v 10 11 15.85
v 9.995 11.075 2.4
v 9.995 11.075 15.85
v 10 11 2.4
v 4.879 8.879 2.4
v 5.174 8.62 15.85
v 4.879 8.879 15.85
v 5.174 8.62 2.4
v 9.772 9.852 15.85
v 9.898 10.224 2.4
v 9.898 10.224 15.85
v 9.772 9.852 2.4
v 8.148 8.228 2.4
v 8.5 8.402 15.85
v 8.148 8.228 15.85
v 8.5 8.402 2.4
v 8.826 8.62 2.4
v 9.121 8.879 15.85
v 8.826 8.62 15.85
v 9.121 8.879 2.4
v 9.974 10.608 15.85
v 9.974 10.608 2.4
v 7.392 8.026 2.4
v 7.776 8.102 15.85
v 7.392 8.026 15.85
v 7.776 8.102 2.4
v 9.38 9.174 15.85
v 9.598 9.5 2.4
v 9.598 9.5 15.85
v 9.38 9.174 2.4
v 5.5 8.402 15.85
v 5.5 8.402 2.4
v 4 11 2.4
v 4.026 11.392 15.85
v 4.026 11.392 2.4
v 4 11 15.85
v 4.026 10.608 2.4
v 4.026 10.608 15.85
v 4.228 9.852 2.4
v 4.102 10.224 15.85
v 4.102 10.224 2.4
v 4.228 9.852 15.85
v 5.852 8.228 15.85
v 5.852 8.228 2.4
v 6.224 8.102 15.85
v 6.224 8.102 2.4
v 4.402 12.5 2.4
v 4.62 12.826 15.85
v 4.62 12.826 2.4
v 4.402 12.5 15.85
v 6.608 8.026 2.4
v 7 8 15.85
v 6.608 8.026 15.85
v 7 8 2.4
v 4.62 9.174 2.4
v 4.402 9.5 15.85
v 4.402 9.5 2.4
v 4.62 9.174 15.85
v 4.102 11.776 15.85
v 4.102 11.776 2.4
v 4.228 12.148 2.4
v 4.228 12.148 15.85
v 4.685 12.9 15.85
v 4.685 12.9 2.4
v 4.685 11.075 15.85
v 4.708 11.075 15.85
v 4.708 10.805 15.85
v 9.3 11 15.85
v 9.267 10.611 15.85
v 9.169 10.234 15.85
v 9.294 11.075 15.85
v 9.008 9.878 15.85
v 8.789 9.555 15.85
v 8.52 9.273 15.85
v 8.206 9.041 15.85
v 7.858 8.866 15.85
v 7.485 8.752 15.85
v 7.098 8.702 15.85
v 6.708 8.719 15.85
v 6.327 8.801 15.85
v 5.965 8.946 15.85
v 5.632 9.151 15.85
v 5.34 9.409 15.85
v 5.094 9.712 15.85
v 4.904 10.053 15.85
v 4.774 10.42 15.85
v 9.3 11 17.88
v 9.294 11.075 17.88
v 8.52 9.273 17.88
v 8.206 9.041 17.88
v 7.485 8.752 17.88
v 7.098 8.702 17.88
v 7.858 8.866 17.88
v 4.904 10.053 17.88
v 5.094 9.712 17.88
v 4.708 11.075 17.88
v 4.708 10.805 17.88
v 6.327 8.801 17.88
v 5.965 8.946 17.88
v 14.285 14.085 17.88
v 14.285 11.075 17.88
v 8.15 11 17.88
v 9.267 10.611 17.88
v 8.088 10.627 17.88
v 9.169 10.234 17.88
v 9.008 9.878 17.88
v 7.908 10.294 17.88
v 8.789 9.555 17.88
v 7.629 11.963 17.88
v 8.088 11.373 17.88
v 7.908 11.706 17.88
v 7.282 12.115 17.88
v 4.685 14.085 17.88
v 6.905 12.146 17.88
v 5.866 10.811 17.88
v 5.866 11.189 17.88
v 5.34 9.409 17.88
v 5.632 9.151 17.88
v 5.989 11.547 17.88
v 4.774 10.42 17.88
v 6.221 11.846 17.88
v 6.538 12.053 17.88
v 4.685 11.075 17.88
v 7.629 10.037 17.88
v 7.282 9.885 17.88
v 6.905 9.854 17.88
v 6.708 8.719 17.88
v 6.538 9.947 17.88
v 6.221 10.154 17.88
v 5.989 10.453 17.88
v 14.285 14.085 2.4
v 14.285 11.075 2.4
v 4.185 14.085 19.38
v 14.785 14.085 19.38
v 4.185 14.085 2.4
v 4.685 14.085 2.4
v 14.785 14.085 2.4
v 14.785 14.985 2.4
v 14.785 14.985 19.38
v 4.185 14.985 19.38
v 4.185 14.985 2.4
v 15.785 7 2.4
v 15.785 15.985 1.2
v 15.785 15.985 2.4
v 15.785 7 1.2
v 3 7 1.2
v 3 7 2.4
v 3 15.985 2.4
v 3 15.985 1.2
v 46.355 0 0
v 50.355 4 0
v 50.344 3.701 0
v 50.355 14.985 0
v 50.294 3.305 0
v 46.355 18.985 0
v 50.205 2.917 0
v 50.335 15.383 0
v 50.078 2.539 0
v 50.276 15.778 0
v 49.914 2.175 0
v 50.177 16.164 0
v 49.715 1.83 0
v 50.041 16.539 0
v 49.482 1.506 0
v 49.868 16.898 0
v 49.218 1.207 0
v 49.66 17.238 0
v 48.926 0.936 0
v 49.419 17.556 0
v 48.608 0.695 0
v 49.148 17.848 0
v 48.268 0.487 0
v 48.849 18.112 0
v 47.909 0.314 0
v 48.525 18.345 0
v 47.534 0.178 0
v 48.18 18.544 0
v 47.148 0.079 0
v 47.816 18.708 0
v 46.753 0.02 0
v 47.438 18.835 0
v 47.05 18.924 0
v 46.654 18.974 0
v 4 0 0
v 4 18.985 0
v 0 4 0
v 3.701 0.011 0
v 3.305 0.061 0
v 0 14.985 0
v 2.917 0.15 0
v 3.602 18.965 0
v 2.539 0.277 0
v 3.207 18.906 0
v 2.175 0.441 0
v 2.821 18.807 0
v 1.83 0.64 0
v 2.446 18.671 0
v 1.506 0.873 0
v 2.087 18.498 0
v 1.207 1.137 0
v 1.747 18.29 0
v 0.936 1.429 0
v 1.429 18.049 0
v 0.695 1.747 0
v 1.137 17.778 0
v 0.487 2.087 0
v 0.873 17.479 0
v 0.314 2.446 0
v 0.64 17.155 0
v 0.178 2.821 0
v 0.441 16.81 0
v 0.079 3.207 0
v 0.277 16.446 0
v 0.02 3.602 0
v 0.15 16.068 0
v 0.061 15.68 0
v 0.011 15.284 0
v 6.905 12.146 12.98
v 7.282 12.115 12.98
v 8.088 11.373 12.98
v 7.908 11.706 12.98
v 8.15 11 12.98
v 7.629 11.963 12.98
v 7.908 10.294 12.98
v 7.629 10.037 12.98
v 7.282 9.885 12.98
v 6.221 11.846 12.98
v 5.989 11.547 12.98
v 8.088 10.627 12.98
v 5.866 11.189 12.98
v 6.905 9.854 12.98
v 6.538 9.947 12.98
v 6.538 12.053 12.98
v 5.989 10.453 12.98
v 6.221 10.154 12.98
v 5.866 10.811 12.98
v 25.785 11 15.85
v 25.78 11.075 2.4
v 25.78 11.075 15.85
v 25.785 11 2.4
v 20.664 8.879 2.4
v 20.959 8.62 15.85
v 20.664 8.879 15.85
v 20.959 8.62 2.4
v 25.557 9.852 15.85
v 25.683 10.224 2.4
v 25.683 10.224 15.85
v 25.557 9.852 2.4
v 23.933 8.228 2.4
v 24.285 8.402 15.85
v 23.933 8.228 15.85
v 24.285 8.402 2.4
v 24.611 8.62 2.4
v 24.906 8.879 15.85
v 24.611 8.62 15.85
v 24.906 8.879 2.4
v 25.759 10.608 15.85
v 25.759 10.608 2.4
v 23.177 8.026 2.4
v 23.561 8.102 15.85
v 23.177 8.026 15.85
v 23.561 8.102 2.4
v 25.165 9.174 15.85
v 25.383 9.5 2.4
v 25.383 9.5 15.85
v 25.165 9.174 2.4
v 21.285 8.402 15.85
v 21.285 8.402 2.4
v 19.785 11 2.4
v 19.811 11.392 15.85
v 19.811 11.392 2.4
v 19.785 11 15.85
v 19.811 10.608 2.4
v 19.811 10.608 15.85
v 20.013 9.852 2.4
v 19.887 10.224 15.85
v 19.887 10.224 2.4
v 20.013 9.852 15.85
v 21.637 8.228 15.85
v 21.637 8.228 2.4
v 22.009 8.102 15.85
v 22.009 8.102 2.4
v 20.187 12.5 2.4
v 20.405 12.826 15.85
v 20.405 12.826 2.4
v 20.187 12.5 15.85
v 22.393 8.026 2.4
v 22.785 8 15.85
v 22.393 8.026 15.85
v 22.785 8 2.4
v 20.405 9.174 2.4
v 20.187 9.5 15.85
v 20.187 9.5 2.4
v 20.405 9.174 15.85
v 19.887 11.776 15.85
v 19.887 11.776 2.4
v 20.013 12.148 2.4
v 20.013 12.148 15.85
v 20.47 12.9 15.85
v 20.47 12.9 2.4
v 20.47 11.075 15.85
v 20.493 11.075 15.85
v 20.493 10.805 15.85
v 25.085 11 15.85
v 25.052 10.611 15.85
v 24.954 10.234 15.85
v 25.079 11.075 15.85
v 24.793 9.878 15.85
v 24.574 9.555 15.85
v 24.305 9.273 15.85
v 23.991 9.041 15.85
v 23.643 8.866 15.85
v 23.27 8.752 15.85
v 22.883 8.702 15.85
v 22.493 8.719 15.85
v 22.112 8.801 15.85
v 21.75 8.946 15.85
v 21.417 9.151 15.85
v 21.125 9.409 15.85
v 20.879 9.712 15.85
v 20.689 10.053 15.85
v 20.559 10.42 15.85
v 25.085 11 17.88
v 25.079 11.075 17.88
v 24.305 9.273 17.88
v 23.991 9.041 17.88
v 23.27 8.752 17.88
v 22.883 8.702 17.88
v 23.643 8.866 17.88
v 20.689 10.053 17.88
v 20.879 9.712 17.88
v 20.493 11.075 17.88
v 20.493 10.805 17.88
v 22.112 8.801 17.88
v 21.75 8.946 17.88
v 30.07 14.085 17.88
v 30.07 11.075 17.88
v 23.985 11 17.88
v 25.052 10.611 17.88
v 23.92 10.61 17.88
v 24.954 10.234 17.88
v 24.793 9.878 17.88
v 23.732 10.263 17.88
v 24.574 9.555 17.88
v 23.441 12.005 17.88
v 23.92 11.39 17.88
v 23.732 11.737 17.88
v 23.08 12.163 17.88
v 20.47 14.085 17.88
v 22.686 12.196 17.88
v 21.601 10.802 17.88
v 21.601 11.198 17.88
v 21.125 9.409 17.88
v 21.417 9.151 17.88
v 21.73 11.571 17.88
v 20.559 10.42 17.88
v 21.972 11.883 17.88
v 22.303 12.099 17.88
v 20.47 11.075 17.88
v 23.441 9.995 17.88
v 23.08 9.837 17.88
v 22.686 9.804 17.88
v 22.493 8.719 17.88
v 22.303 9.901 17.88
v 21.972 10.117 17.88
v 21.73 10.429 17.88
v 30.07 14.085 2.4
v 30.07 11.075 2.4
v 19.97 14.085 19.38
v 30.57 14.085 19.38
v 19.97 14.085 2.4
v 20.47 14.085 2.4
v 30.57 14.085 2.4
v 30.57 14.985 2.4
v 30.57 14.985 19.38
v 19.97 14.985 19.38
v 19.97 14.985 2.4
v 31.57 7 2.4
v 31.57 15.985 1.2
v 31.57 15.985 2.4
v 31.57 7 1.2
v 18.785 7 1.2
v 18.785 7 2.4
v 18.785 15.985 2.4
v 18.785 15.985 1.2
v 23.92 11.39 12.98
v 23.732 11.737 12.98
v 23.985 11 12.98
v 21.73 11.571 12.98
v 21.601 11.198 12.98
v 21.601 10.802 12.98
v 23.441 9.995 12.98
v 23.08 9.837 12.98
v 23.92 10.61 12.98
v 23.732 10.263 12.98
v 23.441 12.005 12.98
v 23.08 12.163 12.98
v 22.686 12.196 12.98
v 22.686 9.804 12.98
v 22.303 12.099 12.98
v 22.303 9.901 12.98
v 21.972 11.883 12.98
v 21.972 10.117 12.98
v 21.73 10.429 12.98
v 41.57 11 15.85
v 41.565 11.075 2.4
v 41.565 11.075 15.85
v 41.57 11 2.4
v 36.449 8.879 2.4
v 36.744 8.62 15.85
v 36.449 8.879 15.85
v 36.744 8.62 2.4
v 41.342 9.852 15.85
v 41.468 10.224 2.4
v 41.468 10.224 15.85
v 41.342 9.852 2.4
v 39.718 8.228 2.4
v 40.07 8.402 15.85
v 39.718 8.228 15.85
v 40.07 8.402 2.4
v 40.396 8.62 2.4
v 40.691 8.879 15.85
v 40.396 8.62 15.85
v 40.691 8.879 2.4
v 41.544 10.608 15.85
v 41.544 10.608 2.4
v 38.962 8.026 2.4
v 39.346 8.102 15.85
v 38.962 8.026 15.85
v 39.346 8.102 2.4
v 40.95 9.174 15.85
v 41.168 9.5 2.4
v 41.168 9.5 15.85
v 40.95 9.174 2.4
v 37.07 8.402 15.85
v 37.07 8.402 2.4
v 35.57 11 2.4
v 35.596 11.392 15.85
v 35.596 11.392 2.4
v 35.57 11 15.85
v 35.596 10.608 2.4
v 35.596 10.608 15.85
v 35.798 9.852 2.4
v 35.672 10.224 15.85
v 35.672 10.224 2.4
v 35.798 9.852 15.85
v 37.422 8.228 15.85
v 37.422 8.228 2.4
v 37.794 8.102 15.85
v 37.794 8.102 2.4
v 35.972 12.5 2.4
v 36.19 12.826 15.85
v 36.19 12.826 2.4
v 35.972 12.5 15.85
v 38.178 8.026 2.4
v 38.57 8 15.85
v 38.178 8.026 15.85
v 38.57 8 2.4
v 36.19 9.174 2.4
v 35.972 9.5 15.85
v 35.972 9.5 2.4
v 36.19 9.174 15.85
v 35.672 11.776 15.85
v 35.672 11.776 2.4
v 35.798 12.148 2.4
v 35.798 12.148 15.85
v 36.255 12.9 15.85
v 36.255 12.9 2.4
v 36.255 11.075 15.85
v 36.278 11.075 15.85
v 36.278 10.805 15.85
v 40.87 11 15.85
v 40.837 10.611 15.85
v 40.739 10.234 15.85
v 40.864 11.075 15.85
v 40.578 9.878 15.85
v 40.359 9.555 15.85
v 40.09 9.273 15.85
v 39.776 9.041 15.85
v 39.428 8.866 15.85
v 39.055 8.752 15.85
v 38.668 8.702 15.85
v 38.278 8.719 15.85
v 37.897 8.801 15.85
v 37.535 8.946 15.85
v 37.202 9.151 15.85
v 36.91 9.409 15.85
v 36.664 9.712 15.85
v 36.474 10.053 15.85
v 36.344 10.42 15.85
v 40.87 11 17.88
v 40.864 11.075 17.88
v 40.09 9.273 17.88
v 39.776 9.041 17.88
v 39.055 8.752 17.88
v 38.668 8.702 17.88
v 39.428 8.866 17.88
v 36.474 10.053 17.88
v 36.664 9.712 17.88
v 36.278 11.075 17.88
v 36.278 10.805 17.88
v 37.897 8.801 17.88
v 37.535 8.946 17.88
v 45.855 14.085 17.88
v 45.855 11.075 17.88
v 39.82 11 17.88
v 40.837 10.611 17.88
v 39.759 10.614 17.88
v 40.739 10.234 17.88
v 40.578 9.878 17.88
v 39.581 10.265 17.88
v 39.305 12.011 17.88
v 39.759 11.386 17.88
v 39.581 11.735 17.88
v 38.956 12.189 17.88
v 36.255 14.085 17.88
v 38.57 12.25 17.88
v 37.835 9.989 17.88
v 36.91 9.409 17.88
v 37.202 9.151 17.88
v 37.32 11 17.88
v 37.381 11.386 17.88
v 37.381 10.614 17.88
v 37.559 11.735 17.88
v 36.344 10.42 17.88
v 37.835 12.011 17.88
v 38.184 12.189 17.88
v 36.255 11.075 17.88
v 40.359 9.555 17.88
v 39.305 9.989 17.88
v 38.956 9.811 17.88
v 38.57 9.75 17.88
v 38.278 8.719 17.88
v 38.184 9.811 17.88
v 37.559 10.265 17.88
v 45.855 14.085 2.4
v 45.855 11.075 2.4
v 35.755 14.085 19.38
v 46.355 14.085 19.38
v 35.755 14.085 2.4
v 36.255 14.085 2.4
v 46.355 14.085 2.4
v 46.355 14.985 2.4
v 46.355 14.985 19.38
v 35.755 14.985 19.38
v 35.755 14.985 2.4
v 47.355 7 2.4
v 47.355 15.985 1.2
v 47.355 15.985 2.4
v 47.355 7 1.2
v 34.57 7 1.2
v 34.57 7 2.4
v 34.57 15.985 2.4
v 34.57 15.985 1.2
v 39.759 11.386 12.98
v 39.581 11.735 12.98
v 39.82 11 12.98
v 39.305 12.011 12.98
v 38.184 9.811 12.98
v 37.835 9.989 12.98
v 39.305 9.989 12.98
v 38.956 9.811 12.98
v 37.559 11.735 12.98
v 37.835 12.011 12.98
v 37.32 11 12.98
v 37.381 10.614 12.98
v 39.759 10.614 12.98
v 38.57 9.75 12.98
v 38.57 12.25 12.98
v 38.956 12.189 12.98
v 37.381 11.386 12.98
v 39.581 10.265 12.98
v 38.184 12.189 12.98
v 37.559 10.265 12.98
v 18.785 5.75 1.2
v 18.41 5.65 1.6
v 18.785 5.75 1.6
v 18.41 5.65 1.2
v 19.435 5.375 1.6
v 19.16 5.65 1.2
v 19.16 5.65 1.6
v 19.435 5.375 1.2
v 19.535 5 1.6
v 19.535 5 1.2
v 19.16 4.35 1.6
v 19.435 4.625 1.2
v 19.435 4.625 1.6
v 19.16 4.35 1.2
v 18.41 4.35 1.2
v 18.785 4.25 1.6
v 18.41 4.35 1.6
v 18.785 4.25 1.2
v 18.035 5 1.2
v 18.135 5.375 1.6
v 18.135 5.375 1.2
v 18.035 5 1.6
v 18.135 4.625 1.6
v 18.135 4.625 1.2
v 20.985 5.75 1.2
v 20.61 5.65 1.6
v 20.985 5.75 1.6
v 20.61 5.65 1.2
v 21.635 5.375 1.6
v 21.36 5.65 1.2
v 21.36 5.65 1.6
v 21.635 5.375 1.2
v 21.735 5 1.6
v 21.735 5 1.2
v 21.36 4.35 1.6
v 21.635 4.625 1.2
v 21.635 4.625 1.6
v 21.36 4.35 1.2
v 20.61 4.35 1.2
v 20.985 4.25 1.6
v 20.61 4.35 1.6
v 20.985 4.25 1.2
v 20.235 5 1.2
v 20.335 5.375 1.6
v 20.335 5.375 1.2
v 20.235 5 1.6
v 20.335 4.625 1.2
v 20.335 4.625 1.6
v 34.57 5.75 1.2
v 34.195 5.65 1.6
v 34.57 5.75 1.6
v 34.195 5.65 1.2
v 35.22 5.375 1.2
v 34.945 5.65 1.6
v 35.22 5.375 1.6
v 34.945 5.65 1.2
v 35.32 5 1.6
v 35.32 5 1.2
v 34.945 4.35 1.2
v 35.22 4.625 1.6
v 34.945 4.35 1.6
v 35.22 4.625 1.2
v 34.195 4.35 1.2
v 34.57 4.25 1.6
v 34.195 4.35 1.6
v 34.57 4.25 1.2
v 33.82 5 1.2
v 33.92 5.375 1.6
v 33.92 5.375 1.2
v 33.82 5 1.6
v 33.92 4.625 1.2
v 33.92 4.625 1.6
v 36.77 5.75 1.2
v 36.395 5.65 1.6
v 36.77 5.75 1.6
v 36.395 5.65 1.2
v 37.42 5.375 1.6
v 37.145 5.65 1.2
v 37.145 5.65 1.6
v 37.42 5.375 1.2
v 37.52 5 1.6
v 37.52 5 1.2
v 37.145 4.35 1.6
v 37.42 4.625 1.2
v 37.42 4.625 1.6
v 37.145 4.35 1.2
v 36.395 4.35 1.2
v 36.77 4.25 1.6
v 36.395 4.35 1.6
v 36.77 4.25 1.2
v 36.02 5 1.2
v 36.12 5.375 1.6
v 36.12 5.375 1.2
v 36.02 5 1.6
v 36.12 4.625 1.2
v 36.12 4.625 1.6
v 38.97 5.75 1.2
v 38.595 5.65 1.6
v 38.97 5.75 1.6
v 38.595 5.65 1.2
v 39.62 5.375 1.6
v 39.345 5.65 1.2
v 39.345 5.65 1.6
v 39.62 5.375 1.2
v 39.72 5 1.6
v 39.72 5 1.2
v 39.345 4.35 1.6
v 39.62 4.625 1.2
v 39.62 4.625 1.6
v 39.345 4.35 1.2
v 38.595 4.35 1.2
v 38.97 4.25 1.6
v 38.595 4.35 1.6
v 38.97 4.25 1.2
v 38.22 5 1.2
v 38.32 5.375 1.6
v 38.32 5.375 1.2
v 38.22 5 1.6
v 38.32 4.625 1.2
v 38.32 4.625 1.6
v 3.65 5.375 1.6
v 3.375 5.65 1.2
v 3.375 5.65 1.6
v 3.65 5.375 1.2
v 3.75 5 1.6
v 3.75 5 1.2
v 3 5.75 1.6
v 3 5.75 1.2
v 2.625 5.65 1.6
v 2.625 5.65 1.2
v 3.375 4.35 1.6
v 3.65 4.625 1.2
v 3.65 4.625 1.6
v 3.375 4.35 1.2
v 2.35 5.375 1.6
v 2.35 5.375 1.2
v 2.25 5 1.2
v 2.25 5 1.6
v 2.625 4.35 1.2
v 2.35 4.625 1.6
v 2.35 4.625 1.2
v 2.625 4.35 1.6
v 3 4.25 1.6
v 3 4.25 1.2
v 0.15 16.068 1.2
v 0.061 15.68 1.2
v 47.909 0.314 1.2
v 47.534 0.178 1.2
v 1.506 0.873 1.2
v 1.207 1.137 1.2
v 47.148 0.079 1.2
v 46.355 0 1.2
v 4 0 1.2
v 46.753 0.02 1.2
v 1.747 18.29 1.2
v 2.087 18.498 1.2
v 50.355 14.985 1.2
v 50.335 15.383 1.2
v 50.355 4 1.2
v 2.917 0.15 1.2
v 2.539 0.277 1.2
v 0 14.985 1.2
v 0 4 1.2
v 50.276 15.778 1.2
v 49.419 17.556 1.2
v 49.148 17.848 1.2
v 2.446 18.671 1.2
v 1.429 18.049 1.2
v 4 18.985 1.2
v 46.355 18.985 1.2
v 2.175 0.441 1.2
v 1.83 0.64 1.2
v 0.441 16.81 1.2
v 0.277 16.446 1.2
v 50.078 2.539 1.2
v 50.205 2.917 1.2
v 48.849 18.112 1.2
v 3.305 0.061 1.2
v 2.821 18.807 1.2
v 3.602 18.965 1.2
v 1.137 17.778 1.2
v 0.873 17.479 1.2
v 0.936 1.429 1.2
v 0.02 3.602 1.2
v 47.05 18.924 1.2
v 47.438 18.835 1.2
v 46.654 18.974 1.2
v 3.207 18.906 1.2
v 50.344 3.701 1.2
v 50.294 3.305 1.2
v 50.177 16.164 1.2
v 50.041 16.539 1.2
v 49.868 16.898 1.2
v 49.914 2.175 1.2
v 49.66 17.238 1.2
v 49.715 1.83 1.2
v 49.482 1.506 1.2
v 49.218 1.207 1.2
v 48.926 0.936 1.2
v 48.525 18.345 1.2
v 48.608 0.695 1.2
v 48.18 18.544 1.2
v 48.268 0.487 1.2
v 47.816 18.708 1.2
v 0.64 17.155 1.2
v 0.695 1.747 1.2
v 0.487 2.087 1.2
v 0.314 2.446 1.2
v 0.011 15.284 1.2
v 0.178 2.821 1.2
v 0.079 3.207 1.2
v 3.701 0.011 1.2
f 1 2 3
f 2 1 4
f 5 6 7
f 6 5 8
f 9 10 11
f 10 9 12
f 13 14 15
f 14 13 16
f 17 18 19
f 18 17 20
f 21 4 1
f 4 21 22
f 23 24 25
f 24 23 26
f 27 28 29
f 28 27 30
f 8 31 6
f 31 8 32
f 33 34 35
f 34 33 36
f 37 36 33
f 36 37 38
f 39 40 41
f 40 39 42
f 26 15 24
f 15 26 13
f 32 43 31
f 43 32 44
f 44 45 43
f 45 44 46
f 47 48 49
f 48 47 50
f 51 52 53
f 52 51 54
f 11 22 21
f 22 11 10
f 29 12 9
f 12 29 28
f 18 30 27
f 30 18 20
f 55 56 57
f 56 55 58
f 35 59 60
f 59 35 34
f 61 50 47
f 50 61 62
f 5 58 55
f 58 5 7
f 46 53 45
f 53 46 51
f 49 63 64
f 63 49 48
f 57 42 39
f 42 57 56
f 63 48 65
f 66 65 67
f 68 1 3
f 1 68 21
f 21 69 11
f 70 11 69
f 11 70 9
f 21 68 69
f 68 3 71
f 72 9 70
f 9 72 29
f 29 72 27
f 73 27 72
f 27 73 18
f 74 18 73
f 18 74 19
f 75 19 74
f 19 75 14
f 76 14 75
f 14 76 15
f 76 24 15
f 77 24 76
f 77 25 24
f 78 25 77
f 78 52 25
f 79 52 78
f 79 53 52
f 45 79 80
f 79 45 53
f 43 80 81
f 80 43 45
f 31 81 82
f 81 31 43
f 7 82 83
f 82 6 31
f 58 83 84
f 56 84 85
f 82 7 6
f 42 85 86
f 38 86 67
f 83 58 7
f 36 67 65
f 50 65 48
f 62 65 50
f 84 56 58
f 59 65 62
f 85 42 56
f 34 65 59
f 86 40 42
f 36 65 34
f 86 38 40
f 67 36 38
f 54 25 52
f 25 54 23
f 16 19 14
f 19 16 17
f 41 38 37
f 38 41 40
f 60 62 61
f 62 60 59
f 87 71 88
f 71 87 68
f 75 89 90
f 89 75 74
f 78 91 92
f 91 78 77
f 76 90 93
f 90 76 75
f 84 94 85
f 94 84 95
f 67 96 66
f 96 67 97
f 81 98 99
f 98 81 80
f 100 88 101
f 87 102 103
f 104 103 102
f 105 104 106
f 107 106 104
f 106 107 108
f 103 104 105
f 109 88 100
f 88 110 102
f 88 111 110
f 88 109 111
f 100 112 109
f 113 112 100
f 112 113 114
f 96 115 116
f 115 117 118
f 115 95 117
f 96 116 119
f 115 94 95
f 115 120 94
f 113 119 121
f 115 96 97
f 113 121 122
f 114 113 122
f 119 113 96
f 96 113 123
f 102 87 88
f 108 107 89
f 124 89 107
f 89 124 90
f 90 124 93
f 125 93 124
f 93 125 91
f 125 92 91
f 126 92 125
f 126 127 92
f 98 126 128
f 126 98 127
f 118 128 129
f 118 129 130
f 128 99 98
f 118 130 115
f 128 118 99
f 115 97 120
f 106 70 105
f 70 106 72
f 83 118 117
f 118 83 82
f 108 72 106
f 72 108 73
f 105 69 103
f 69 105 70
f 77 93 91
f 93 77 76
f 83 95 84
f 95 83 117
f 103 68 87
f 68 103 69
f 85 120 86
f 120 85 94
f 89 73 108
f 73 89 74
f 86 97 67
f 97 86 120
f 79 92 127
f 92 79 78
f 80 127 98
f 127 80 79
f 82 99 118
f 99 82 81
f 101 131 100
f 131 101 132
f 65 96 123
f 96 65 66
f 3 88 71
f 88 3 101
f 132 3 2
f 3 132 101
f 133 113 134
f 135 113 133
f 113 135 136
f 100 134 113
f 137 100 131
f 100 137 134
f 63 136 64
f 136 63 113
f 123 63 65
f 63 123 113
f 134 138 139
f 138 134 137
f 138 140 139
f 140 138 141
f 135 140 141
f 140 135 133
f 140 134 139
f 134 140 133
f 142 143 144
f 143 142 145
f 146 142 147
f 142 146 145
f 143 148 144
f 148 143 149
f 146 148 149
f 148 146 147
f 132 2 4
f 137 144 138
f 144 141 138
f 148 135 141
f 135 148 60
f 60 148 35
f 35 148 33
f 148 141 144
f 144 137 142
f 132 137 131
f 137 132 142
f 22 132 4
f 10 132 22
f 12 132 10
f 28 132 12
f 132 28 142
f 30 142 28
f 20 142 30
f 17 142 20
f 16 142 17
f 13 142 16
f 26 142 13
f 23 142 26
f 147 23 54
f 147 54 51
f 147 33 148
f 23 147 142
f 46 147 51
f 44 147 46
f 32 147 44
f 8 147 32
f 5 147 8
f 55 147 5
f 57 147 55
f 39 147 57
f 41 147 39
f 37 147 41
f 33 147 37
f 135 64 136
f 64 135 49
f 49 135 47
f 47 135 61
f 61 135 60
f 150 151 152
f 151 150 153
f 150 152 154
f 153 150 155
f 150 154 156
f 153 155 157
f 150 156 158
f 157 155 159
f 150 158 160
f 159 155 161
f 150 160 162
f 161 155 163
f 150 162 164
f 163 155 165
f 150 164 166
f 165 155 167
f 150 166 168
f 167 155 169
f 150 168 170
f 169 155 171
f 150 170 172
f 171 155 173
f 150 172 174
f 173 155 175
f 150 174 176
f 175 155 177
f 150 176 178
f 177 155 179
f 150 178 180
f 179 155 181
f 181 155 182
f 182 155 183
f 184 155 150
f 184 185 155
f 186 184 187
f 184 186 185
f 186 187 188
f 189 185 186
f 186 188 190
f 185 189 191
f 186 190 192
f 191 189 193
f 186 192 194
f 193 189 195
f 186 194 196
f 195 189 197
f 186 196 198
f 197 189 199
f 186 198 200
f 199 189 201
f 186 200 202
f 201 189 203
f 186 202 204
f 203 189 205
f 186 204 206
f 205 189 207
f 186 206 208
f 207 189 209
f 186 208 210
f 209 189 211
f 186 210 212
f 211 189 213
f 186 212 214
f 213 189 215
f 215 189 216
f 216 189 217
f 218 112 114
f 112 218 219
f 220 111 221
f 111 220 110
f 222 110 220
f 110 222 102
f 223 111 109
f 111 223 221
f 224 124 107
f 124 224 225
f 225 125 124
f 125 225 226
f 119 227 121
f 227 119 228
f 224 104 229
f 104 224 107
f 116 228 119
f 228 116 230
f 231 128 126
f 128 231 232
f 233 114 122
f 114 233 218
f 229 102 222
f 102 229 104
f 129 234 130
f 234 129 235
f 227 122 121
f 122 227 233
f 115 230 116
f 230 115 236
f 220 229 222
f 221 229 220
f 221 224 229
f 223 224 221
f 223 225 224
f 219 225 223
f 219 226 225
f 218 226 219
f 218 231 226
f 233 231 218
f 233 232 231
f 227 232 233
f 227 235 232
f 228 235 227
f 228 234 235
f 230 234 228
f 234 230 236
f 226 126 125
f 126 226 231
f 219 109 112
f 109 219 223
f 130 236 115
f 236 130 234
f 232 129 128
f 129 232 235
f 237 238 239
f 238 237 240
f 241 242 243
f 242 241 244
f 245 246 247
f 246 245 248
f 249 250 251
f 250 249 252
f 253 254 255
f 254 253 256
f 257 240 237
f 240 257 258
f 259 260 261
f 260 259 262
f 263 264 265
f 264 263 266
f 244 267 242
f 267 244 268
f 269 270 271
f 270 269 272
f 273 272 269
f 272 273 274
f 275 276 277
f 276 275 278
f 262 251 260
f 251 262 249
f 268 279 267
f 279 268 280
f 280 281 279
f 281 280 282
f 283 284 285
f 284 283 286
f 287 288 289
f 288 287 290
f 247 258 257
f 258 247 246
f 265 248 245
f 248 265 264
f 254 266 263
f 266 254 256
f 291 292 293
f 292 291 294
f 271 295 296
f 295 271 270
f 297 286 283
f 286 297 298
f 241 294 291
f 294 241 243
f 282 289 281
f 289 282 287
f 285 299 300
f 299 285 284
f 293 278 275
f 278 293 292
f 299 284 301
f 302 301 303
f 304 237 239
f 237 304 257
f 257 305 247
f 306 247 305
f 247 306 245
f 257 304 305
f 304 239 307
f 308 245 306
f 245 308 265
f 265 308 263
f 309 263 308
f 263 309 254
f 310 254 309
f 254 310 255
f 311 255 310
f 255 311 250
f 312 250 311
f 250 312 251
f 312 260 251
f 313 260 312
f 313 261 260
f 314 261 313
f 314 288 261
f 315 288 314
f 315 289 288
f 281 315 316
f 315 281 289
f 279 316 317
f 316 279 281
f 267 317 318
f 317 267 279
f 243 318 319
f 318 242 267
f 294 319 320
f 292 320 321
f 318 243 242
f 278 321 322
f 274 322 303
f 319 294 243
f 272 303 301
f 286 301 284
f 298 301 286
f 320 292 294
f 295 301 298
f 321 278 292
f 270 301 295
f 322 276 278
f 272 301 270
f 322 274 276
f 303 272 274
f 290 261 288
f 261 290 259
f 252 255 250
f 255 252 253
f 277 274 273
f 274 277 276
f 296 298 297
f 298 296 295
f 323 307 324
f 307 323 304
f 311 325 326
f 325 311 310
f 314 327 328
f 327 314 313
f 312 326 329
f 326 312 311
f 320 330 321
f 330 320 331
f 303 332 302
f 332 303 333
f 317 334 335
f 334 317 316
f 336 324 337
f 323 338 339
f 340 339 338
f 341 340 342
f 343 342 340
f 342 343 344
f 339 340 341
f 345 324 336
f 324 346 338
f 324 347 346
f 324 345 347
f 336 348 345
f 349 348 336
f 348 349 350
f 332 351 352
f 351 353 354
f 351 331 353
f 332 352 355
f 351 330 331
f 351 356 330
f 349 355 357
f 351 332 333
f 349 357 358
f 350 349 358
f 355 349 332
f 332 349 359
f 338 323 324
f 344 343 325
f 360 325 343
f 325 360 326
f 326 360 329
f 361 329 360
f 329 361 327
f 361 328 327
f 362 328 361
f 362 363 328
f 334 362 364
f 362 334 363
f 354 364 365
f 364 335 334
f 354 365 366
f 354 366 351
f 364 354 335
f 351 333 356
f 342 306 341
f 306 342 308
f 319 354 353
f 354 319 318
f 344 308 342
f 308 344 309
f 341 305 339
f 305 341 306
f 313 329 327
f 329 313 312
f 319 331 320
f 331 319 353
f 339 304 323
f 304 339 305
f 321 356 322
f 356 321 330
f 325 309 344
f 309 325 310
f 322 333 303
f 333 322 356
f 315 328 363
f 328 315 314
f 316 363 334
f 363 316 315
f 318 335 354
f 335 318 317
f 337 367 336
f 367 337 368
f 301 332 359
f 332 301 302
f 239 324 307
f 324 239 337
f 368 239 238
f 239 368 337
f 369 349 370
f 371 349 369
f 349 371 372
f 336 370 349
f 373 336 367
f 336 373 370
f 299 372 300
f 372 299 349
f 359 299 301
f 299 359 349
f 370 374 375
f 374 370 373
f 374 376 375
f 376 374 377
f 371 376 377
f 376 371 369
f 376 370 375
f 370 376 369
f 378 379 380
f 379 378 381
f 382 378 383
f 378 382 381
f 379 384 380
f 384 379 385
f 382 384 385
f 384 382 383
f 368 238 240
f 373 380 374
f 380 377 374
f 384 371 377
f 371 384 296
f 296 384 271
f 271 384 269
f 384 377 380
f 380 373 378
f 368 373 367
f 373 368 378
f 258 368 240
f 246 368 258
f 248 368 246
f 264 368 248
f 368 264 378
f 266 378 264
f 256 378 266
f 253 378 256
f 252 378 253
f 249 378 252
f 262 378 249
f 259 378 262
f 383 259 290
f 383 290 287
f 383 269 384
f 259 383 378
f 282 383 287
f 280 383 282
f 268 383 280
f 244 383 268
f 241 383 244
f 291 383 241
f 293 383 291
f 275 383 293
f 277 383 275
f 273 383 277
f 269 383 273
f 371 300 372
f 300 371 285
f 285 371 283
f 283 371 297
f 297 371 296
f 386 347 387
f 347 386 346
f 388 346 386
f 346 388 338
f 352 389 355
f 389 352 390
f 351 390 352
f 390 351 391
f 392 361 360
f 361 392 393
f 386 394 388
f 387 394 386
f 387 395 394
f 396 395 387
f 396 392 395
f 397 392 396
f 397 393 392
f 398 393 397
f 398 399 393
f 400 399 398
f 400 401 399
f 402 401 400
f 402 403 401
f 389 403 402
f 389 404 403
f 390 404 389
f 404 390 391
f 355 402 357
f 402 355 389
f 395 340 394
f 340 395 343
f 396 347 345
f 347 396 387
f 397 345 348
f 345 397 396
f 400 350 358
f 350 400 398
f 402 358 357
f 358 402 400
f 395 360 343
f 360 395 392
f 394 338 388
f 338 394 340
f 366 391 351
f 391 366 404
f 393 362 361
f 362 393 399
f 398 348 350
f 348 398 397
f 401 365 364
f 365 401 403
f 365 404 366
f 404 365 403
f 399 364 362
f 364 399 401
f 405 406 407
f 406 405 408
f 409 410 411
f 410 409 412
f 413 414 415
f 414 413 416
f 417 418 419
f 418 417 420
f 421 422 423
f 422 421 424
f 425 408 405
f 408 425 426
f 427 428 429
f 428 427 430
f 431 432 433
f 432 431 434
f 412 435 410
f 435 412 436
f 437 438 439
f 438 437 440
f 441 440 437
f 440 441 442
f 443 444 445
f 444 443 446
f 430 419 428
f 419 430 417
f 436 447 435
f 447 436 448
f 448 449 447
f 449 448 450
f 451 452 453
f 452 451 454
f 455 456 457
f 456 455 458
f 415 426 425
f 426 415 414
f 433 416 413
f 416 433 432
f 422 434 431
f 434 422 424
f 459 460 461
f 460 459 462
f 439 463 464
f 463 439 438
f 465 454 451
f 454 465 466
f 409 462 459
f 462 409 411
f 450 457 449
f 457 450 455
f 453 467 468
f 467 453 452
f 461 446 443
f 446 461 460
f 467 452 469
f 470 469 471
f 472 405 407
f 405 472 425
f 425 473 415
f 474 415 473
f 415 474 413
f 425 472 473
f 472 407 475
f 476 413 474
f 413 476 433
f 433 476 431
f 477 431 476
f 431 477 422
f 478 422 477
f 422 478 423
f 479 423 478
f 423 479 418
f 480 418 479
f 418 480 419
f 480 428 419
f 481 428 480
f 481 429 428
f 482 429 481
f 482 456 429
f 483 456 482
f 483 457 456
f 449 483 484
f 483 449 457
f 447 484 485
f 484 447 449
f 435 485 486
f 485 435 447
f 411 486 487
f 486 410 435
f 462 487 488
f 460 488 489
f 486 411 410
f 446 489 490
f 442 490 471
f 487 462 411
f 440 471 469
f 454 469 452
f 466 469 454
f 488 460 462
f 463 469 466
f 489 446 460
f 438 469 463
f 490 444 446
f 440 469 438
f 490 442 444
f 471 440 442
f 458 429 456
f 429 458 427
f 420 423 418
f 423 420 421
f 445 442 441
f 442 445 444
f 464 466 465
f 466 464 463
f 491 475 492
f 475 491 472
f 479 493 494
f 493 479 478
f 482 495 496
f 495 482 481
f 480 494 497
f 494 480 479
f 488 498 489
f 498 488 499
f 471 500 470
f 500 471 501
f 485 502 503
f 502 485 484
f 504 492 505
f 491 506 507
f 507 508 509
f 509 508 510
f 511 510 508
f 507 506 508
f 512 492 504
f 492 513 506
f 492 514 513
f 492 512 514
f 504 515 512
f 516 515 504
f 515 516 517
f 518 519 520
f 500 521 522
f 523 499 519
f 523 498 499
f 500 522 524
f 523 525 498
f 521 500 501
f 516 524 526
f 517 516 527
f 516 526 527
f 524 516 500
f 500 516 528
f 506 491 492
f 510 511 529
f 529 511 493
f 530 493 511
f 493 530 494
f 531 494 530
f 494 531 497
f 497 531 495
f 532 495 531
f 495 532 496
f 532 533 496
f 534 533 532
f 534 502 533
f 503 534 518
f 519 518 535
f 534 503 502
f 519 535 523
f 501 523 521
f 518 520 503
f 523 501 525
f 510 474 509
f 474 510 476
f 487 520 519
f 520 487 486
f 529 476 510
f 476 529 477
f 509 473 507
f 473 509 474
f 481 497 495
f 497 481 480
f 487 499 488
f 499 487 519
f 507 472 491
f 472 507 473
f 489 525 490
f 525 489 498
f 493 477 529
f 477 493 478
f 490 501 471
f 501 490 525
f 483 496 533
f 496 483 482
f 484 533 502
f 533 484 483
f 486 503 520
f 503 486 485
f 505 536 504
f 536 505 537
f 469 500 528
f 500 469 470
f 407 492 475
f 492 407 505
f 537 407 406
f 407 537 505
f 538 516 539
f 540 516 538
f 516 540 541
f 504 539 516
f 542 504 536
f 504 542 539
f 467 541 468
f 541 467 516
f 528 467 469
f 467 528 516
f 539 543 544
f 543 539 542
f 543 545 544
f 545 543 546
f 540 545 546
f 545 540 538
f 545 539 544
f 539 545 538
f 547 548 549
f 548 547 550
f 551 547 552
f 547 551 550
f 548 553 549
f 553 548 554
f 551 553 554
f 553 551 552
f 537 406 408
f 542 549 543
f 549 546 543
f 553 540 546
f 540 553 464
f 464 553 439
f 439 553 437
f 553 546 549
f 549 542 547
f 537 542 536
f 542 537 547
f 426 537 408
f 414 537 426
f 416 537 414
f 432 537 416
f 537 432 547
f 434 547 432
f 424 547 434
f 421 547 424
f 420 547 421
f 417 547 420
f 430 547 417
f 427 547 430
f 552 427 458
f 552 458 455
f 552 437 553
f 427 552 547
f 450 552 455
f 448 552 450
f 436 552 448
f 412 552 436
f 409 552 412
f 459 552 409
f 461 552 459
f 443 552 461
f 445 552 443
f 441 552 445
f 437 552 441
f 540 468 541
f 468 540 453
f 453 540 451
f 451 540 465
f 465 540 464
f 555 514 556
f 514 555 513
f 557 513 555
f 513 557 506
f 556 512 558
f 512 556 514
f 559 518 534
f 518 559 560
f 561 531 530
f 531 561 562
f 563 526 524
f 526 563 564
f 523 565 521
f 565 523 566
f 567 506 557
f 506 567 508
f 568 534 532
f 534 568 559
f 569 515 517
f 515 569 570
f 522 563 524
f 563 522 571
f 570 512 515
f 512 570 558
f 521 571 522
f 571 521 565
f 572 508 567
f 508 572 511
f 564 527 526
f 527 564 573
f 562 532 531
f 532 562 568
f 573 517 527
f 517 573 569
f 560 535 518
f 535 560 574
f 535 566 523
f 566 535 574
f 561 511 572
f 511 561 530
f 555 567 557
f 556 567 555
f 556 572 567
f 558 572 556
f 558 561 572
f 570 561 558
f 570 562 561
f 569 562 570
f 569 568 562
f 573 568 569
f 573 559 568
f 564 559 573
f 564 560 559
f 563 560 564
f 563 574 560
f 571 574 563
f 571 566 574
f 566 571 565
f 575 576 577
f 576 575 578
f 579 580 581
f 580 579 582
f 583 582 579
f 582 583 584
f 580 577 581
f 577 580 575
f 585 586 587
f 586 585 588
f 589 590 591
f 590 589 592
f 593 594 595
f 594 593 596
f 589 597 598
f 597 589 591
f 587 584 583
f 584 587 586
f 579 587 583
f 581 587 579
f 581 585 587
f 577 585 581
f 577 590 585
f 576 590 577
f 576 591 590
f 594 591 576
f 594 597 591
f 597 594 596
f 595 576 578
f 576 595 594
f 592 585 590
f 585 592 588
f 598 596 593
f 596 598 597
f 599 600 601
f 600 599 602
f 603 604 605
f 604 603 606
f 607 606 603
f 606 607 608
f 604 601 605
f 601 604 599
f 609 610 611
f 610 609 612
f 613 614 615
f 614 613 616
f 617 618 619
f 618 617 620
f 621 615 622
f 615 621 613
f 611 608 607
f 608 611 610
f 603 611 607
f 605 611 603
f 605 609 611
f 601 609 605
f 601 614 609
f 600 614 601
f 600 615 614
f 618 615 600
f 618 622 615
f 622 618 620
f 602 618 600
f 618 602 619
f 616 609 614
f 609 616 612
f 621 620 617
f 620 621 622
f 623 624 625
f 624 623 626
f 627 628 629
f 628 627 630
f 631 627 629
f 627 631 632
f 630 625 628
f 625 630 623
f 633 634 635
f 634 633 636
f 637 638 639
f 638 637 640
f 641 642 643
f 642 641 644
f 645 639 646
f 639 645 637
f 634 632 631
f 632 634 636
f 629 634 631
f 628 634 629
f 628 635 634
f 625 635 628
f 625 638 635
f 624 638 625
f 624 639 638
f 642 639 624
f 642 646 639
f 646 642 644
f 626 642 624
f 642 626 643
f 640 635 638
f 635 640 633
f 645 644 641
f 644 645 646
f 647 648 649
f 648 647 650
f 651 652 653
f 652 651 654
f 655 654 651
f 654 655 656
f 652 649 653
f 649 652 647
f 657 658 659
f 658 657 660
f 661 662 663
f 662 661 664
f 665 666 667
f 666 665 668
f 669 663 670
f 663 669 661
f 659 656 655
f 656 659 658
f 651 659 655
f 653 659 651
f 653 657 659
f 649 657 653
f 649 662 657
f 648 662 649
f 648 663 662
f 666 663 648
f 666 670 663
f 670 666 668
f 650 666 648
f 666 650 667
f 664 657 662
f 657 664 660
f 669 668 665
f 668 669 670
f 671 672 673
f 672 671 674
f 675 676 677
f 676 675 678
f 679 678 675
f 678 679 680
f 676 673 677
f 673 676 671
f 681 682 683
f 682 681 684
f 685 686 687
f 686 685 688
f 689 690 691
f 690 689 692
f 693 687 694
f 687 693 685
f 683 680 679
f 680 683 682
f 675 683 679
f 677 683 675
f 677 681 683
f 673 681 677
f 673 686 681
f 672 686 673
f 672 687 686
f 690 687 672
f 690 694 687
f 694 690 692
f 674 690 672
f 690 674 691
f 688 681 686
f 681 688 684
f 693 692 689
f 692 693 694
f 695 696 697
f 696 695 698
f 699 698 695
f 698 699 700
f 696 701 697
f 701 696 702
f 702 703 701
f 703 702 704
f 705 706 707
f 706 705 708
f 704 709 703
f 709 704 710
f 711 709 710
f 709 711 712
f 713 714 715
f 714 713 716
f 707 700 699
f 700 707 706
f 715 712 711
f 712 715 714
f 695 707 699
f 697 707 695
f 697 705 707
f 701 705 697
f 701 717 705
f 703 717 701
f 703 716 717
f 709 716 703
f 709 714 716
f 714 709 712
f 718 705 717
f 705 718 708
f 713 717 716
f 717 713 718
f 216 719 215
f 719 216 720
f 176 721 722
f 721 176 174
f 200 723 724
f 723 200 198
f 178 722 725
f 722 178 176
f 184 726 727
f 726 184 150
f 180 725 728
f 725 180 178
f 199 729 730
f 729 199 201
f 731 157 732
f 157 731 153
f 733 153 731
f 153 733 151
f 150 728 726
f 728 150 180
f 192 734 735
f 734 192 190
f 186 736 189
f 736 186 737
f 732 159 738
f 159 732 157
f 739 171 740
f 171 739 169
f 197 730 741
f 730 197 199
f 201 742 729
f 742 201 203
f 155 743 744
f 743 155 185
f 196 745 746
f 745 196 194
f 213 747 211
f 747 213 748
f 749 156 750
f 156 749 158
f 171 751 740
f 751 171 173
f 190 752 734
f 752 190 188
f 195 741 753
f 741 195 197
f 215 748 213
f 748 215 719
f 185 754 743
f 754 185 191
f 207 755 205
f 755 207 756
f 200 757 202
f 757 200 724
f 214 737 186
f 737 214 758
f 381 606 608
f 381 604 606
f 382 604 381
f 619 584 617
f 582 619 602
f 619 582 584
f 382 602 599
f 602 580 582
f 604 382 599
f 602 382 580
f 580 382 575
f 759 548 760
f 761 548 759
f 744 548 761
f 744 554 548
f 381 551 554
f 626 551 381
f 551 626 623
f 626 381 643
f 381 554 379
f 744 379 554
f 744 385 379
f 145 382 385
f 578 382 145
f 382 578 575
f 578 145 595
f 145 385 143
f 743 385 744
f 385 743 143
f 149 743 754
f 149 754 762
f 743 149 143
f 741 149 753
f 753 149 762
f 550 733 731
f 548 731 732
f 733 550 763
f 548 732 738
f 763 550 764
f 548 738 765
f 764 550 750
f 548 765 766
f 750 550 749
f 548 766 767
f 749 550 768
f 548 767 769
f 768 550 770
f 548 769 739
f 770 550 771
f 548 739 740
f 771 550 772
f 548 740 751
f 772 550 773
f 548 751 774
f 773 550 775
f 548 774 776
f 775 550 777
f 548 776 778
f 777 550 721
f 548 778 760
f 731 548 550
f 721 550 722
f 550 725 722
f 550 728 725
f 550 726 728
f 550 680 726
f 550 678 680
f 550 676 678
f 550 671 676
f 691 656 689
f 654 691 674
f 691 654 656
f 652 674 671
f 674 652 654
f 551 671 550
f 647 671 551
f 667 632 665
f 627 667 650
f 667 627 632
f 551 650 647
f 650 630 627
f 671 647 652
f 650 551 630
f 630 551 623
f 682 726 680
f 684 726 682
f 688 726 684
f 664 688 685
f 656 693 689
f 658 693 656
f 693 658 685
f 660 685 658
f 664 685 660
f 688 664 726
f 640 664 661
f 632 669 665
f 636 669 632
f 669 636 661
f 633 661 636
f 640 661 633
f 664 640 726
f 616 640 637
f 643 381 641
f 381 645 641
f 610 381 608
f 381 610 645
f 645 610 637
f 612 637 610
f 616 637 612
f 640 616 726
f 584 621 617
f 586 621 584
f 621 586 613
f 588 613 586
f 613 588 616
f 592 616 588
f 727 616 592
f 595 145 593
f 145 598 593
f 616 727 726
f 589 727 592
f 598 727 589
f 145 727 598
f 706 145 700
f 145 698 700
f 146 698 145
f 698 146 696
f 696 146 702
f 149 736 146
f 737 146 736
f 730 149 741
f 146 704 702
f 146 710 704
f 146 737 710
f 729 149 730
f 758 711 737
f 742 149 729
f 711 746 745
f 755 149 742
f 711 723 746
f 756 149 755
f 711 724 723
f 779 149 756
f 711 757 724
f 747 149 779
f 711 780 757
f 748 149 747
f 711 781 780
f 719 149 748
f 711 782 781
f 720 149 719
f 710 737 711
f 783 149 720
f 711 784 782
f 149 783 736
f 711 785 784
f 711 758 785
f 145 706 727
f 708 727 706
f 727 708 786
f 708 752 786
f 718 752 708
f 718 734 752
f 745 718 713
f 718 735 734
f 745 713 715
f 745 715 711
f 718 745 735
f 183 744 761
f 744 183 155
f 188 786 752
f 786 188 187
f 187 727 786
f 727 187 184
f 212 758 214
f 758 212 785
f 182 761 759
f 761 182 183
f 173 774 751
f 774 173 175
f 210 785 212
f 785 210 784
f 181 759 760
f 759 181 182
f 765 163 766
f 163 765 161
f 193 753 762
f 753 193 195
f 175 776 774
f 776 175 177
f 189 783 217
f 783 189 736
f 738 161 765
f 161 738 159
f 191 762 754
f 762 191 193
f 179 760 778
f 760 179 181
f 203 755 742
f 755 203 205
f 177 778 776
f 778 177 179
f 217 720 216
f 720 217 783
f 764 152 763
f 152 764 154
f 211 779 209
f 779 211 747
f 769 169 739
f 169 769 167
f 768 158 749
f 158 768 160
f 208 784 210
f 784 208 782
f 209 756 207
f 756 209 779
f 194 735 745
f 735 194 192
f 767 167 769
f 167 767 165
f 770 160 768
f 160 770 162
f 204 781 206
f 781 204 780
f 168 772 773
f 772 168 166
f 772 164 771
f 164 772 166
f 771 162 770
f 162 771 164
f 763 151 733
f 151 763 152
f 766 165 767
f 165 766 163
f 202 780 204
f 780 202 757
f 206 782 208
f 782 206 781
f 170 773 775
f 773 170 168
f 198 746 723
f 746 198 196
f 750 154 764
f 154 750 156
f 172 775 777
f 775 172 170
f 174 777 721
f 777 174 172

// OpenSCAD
// SPDX-FileCopyrightText: 2026 Alon A. Rabinowitz
// SPDX-License-Identifier: CC-BY-4.0
// Shared under the Creative Commons Attribution 4.0 International licence
// (LICENSES/CC-BY-4.0.txt): reuse freely, including commercially, with attribution.

/*
The clearance test for the air-quality monitor: one small print that tries every untested fit in
air-quality-monitor.params.scad at three settings - a step tighter, as set, and a step looser - so the box
is printed with fits that were tried in ASA on this printer rather than guessed.

It INCLUDES the box, and every piece is the box's own geometry, drawn by the box's own modules with only
the fit changed and turned onto the bed as the back plate is. So the test cannot drift from what it
tests, and each piece prints the way it will in the box. Each try carries 1, 2 or 3 dots: 1 = a step
tighter, 2 = as set, 3 = a step looser. docs/clearance-test.md says what to try with each, how to turn
the result into a setting, and what has been found so far.

  M  gy_pilot_d   three of the SGP41's mounts - post, rib and ledge - each with its pilot upright

This is the third round. The first two, of 2 Oct and 3 Oct 2026, settled every other fit; their pieces
are in the history.

draw_fits = false after including this file draws nothing, as fits-map.scad does.
*/
include <air-quality-monitor.scad>
draw_model = false;   // after the include: the box's own parts stay undrawn
draw_fits = true;

fit_step = 0.1;             // the step for every fit here
m = 3;                      // margin round and between the pieces
row = 4;                    // gap in front of each try, towards the printer's front; its dots sit in it
dot_d = 1.5;                // the tags: about three beads across, two layers proud
base_t = 6 * fdm_layer_h;   // 1.2 mm: the floor everything stands on

function ladder(v, s) = [v - s, v, v + s];
// Smaller is tighter. No hole may go under 2 mm (the rules below), so with the pilot at 2.0 the ladder
// starts there instead: 1 dot is then the setting itself.
gy_pilots = ladder(max(gy_pilot_d, 2 + fit_step), fit_step);

// The box's geometry is drawn in its own frame - X across, Y out from the wall, Z up - and the back plate
// prints flat on its back. This is the turn its part file makes: the box's Y comes up off the bed.
module to_bed() rotate([90, 0, 0]) children();

// ------------------------------------------------------------------ M: the SGP41's mounts
// The box's post, rib and ledge, on as much plate as they stand on, the pilot down the post. Screwed on,
// the module reaches past the pad towards the printer's front, above the dots.
m_x0 = min(gy_hx - gy_post_d / 2, gy_x0) - 1;        // the pad, in the box's frame
m_x1 = max(gy_hx + gy_post_d / 2, gy_x1) + 1;
m_z0 = gy_z0 - pocket_fit - rim_t - 1;
m_z1 = max(gy_hz + gy_post_d / 2, gy_rib_z1) + 1;
module m_piece(d) difference() {                    // in the box's frame
    union() {
        gy_mount();
        box3([m_x0, 0, m_z0], [m_x1, back_t, m_z1]);
    }
    gy_pilot(d);
}

// ------------------------------------------------------------------ layout: one row
m_w  = m_x1 - m_x0;                         // a piece across, on the bed
m_d  = m_z1 - m_z0;                         // and front to back
m_y  = m + row;                             // each pad's front edge
m_xs = [for (i = [0 : 2]) m + i * (m_w + m)];
BW = m + 3 * m_w + 2 * m + m;
BH = m_y + m_d + m;

// ------------------------------------------------------------------ the rules
assert(min(gy_pilots) >= 2, "a hole under 2 mm distorts or closes up - fdm-design-rules §2");
assert(whole(base_t / fdm_layer_h), "printed flat: whole layers only");

// ------------------------------------------------------------------ pieces
module tag(n, x, y, z = base_t)
    for (i = [0 : n - 1])
        translate([x + i * (dot_d + 0.7), y + dot_d / 2, z - eps]) cylinder(d = dot_d, h = 2 * fdm_layer_h + eps);

// every try's dots, in the gap in front of it - a module of their own, so fits-map.scad can show them in a
// colour
module tags() for (i = [0 : 2]) tag(i + 1, m_xs[i], m_y - row / 2 - dot_d / 2);

// ------------------------------------------------------------------ the part
module fits() union() {
    // the base, corners rounded against ASA's lifting
    linear_extrude(height = base_t) offset(r = corner_r) offset(delta = -corner_r) square([BW, BH]);
    for (i = [0 : 2]) translate([m_xs[i] - m_x0, m_y + m_z1, 0]) to_bed() m_piece(gy_pilots[i]);
    tags();
}

echo(str("clearance test: ", BW, " x ", BH, " mm base; dots 1 / 2 / 3 = a step tighter / as set / a step looser"));
echo(str("  M gy_pilot_d ", gy_pilots, ", the post's top ", gy_standoff_d, " mm across"));

if (draw_fits) fits();
